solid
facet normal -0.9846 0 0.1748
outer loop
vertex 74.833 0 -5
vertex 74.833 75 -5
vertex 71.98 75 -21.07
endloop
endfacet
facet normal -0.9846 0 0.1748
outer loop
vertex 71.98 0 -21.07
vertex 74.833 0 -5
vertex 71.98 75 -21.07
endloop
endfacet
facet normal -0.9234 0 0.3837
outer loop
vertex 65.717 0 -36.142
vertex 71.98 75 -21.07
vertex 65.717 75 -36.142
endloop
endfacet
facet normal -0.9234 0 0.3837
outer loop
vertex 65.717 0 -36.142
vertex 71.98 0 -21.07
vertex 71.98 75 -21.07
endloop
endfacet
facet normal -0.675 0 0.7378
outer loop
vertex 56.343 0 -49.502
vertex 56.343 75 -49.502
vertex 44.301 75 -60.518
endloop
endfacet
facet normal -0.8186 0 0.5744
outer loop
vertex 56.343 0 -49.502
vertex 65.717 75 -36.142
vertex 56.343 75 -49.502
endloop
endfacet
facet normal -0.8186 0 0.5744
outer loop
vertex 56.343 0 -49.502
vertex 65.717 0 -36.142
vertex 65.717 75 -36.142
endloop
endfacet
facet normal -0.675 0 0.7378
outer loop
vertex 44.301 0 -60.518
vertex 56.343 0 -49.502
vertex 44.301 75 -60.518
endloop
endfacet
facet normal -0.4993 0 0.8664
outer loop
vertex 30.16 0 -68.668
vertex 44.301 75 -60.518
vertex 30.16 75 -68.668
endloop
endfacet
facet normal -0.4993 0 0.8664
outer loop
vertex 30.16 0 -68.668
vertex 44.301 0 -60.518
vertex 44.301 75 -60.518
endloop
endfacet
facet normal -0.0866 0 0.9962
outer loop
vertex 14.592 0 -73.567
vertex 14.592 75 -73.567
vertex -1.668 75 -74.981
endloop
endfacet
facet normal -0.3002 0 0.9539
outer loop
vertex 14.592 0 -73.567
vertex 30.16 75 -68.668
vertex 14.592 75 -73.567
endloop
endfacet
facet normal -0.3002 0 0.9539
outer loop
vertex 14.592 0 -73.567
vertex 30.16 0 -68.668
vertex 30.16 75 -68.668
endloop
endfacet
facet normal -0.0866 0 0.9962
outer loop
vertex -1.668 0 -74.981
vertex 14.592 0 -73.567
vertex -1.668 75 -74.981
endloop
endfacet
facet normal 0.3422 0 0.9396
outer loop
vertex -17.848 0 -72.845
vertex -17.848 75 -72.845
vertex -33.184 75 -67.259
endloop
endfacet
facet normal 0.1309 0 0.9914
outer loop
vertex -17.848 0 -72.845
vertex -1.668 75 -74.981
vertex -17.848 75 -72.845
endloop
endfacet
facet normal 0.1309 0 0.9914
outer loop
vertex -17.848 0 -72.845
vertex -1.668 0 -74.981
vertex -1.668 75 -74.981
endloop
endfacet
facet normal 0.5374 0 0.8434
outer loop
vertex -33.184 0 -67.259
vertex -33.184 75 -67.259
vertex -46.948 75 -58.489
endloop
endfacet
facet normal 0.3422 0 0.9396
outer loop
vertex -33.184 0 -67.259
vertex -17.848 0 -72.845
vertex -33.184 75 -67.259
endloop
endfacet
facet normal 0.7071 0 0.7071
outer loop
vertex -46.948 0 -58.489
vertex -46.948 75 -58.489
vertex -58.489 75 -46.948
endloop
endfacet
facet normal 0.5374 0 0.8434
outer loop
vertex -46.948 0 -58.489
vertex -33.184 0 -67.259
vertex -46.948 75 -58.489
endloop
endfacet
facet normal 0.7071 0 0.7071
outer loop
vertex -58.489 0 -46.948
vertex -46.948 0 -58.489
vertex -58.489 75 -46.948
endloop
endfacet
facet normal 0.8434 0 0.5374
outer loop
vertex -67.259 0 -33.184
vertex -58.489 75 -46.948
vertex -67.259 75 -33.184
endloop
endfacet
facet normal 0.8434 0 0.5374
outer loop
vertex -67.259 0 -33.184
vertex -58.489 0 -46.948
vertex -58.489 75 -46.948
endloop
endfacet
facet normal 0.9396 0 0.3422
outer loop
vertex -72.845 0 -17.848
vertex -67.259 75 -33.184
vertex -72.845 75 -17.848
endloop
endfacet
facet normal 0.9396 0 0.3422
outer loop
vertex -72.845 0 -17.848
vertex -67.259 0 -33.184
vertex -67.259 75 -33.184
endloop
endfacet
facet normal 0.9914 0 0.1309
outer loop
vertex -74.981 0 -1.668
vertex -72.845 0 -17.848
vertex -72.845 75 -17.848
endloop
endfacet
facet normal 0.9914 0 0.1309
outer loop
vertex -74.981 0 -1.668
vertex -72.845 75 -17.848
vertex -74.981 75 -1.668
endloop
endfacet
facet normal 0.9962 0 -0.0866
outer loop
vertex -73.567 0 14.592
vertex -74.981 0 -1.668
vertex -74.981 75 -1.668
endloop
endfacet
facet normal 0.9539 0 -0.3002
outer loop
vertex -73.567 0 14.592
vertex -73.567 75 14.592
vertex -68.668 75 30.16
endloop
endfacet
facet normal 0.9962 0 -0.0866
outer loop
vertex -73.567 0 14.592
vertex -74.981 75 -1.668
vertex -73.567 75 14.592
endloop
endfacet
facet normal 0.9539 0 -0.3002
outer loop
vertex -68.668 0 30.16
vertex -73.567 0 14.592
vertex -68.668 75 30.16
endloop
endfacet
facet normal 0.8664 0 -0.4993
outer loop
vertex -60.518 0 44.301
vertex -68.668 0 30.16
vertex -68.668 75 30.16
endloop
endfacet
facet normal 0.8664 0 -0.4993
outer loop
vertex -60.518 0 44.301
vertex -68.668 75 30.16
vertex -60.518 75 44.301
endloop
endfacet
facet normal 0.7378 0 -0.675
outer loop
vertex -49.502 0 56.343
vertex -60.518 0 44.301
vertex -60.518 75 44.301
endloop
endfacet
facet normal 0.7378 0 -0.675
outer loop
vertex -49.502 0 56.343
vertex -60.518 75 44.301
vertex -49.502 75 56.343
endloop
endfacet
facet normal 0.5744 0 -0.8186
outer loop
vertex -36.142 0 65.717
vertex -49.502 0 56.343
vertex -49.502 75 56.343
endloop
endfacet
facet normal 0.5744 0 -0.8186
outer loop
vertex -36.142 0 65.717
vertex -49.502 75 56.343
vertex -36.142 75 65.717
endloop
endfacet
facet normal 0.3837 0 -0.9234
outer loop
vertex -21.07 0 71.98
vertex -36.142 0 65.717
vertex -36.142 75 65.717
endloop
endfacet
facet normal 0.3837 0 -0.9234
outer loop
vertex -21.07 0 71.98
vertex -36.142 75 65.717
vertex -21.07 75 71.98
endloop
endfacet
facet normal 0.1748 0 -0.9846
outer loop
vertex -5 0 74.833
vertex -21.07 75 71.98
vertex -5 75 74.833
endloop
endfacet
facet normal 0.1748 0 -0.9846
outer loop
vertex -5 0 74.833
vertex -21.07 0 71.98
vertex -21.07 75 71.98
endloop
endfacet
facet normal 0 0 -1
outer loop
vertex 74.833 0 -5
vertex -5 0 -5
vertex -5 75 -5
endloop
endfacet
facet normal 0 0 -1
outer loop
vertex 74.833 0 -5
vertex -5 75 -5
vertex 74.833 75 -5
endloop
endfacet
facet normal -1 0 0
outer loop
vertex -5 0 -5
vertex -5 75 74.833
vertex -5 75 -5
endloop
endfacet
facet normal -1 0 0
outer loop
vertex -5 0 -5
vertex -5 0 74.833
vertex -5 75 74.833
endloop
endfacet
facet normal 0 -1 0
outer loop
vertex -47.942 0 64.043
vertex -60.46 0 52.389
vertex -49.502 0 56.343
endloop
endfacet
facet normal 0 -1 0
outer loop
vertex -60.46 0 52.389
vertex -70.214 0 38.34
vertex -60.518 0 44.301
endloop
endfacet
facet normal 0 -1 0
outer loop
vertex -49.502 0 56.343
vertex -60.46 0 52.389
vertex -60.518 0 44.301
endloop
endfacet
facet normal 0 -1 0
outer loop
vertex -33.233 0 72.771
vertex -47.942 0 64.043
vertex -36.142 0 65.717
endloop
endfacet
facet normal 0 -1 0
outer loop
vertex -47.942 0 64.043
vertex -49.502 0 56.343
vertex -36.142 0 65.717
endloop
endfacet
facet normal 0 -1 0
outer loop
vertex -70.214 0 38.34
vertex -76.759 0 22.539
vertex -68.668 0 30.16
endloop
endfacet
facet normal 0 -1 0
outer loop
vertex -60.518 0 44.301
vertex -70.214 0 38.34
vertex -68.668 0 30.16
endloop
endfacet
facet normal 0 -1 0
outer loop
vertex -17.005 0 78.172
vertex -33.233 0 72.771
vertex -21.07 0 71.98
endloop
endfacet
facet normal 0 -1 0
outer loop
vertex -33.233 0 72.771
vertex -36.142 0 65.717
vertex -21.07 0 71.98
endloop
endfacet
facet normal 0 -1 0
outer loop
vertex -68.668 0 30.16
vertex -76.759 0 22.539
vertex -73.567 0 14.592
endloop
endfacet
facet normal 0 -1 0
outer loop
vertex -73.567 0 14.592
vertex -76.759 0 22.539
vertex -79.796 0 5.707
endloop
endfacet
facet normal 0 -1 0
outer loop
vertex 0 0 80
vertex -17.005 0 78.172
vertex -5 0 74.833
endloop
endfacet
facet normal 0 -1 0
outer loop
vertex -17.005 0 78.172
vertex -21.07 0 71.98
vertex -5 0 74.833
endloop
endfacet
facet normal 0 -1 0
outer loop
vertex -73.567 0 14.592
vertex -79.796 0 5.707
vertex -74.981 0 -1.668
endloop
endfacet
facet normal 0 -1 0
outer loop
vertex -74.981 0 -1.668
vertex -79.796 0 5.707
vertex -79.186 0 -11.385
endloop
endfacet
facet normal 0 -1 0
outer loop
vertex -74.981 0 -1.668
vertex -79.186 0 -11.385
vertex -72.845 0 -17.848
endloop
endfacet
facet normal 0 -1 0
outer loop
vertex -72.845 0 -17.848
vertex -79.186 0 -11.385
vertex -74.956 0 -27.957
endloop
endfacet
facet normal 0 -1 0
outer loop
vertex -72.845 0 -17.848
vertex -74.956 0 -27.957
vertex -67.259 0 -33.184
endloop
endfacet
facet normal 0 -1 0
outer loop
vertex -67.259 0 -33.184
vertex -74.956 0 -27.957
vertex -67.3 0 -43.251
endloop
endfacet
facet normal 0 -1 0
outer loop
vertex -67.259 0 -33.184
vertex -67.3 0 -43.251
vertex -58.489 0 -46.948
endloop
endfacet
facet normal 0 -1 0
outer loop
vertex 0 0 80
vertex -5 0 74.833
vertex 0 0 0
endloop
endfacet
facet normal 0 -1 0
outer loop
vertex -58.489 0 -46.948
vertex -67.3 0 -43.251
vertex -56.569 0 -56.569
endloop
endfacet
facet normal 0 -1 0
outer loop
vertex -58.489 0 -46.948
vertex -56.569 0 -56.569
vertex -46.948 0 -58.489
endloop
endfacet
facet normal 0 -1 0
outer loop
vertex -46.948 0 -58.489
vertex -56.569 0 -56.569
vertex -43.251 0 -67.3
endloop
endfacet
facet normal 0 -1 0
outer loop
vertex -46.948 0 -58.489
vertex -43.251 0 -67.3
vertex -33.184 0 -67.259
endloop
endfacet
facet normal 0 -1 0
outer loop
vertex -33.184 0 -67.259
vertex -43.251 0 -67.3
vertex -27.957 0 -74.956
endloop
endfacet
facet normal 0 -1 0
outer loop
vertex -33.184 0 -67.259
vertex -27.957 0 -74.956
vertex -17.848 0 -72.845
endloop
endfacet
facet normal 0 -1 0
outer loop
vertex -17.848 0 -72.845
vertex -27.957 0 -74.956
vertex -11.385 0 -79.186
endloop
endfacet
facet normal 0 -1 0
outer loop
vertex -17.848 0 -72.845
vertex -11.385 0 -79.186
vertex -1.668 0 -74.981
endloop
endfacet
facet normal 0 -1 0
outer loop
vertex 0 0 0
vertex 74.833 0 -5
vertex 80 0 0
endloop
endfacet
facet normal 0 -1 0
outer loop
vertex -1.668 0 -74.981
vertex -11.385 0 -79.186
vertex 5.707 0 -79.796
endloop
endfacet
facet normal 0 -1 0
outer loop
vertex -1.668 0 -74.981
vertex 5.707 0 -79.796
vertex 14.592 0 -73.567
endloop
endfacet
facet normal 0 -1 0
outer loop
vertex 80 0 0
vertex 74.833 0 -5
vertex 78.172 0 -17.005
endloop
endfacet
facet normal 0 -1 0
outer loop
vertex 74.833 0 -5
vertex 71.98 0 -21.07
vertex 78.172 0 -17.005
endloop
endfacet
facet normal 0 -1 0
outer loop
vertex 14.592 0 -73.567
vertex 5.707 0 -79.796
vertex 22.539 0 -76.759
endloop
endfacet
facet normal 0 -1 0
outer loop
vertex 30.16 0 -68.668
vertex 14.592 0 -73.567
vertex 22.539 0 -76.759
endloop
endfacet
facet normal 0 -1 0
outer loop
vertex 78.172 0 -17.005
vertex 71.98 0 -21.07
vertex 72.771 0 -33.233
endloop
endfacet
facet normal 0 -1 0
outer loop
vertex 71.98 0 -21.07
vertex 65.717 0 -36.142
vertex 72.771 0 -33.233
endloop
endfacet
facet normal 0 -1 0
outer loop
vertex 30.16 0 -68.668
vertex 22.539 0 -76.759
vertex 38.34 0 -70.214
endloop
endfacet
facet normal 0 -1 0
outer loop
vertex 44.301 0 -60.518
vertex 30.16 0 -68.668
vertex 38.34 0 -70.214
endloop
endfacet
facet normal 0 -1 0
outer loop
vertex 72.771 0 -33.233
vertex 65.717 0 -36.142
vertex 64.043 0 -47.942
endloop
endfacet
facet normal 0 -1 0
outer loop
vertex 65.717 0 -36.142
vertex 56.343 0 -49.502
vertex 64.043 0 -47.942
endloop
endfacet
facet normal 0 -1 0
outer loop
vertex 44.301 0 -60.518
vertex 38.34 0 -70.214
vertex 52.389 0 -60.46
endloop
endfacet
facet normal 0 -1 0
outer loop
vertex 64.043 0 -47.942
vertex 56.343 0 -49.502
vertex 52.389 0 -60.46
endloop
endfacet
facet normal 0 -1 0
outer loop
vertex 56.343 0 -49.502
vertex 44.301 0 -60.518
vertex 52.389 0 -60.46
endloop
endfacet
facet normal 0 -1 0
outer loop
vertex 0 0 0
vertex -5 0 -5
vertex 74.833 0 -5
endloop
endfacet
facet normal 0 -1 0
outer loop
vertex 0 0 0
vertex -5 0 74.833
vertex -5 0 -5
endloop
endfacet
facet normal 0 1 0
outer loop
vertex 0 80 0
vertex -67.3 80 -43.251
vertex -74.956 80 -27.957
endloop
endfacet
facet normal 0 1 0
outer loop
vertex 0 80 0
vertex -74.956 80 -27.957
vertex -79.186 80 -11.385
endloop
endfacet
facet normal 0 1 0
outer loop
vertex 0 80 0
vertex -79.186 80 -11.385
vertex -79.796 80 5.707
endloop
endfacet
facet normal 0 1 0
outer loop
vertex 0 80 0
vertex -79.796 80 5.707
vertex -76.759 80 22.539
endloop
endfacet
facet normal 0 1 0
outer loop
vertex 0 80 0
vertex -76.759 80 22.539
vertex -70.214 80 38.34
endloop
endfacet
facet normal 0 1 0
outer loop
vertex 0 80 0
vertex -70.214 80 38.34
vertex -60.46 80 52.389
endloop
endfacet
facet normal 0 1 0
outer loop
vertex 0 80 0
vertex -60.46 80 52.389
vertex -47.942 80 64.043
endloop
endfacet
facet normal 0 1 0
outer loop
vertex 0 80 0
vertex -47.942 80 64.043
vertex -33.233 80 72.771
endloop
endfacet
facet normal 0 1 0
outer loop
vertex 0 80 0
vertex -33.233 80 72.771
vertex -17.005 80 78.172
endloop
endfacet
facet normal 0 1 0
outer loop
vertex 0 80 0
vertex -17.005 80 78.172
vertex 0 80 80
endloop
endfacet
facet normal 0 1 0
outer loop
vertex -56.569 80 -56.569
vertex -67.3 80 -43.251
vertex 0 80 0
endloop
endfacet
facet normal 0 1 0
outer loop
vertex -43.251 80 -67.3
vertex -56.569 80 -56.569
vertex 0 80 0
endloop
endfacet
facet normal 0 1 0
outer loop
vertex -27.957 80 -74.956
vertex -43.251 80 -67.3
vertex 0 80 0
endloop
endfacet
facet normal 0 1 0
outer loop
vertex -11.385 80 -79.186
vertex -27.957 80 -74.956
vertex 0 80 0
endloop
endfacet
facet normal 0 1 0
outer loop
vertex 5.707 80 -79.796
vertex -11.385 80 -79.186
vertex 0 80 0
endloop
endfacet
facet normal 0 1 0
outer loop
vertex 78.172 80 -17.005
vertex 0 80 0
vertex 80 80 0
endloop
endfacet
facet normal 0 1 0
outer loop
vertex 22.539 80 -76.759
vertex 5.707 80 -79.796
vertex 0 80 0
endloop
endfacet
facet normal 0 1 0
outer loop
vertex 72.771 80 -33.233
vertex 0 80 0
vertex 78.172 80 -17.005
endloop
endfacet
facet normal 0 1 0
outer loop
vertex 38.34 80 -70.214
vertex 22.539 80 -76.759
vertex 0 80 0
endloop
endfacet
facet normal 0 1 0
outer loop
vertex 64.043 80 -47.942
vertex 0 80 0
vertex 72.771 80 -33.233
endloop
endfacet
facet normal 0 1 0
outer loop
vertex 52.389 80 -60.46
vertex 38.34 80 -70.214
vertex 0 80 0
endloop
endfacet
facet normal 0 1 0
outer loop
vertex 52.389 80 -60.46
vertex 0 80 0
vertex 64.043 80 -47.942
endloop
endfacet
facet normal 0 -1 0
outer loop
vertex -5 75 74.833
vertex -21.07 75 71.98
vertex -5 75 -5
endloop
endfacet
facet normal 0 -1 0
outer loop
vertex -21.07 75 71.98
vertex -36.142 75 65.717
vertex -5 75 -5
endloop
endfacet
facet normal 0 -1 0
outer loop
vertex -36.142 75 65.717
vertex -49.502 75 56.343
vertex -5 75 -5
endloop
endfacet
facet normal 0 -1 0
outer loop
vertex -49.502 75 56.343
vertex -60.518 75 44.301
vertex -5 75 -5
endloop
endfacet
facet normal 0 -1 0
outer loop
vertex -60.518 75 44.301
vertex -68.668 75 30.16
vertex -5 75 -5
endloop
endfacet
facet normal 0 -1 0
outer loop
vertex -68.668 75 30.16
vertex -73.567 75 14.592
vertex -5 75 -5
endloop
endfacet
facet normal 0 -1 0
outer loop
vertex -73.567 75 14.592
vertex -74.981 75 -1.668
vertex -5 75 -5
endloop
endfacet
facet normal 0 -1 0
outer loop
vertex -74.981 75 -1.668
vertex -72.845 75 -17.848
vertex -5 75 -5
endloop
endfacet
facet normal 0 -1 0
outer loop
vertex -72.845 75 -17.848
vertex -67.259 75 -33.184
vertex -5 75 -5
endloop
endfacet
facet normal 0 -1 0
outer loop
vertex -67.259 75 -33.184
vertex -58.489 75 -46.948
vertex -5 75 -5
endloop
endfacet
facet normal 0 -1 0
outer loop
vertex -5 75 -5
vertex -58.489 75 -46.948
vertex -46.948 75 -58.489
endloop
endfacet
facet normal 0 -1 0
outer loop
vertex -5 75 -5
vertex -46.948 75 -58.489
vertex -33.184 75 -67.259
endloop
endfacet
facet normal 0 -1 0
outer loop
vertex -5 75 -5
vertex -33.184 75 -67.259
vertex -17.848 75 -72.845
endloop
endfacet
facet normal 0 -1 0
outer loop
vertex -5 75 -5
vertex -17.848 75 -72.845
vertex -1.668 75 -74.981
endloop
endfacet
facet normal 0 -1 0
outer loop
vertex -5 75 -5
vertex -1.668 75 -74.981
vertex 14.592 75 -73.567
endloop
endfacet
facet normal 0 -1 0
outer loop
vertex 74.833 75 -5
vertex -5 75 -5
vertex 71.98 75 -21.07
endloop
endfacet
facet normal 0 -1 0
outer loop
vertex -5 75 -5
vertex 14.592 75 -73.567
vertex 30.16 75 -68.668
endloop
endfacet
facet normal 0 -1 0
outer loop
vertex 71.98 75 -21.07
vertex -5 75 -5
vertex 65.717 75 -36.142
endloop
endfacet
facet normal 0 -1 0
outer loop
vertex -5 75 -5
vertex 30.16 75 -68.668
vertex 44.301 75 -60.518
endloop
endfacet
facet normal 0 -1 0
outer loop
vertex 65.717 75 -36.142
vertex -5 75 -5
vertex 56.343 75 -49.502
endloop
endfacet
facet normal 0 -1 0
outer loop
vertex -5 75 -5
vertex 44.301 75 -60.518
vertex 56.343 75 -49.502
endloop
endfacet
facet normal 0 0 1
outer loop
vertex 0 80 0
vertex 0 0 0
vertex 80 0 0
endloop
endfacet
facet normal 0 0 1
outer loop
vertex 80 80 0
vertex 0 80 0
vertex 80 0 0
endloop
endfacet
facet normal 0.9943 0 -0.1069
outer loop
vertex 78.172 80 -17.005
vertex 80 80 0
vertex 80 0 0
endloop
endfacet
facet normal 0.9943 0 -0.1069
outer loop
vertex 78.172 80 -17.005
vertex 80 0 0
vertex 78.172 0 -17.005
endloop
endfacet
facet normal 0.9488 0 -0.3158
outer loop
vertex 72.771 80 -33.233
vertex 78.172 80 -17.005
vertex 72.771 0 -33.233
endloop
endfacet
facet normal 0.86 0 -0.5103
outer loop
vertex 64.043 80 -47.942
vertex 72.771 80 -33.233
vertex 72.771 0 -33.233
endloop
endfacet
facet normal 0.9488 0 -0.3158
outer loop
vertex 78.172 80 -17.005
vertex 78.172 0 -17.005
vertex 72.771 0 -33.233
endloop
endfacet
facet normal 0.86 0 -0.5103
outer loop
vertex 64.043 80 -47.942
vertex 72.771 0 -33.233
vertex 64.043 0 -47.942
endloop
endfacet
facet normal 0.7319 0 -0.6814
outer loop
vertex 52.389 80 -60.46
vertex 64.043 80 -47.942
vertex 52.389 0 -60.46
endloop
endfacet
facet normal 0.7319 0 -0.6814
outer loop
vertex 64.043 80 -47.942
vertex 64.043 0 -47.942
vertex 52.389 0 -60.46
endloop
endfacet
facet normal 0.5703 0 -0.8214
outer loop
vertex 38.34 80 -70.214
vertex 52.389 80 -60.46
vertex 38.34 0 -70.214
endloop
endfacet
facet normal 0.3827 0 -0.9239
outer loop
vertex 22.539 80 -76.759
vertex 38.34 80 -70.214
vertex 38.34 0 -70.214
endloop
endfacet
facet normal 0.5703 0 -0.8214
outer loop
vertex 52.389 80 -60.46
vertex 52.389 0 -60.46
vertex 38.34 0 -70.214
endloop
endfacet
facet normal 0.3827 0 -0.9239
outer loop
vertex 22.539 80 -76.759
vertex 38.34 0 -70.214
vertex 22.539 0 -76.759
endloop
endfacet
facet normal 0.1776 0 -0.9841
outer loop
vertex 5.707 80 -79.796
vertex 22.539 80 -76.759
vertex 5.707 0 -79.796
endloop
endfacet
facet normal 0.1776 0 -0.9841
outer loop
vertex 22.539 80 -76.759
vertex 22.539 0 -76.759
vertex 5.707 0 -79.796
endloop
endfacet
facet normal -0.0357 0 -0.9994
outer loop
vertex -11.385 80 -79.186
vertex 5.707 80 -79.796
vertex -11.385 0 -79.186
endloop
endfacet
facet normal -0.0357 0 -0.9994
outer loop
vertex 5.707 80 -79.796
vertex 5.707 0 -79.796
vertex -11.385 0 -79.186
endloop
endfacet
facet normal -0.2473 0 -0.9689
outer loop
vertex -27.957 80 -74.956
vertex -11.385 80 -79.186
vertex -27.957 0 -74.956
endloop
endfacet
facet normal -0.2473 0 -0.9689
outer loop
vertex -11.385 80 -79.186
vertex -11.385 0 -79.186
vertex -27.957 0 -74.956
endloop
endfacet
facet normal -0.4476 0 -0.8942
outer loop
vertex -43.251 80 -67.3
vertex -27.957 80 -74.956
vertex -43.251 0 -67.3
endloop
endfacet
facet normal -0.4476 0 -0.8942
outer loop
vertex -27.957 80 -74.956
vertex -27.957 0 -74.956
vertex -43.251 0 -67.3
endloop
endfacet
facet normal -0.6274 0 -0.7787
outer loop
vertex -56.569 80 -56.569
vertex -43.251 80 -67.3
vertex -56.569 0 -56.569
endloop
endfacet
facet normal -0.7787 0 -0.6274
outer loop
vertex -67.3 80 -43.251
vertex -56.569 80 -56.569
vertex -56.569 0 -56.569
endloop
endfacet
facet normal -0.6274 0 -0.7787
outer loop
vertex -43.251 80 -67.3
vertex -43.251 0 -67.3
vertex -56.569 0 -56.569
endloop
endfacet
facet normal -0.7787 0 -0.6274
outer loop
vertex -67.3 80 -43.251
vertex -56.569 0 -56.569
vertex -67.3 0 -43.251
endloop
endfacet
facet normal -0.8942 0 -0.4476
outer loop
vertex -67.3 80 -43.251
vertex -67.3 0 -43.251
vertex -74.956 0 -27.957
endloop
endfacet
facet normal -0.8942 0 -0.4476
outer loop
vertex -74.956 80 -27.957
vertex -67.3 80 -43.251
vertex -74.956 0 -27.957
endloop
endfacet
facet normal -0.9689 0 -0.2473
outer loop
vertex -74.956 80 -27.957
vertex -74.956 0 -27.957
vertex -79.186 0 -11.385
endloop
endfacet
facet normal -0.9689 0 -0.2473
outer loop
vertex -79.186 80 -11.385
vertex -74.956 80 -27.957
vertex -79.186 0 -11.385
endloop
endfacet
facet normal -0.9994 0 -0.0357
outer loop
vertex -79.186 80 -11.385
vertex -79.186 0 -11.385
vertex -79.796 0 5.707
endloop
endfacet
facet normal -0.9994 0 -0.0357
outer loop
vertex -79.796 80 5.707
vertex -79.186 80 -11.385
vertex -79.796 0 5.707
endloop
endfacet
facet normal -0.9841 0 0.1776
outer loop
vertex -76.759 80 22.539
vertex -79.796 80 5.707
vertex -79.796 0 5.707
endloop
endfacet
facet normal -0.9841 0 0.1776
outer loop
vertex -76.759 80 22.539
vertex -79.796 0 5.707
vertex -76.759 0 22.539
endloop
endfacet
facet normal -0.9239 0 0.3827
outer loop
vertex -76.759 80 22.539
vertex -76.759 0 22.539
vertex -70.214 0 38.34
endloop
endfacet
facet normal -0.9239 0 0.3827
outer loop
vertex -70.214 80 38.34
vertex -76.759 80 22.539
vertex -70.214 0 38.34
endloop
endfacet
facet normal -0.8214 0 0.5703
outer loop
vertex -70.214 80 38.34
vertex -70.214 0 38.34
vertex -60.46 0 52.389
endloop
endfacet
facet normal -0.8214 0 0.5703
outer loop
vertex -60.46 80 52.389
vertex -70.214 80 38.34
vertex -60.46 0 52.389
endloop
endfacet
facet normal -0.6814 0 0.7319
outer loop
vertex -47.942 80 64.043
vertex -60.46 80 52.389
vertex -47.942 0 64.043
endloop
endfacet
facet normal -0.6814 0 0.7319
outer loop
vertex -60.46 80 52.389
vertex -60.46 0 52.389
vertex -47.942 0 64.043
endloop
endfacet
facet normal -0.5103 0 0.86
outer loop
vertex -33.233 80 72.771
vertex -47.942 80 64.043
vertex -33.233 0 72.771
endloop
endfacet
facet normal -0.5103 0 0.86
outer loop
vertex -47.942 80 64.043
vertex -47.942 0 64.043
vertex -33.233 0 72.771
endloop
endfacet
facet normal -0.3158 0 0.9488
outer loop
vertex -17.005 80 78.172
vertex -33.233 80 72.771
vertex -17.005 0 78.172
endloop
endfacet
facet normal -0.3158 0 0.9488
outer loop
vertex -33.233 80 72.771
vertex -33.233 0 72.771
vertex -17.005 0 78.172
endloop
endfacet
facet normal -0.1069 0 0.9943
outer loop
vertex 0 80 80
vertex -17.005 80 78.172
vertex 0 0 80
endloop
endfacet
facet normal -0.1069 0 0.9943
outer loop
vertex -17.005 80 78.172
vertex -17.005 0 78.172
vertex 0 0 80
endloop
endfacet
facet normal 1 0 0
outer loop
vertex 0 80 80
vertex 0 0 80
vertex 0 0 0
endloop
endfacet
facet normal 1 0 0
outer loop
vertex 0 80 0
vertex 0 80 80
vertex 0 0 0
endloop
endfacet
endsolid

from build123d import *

# Parameters (mm, degrees)
BOSS_EXTRUDE1_DEPTH = 80
SHELL1_T            = -5


with BuildPart() as part:
    # Sketch2 → Boss-Extrude1 (new body)
    with BuildSketch(Plane(origin=(0, 0, 0), x_dir=(1, 0, 0), z_dir=(0, 1, 0))):
        with BuildLine():
            Line((0, 0), (80, 0))
            ThreePointArc((80, 0), (-56.568542495, 56.568542495), (0, -80))
            Line((0, -80), (0, 0))
        make_face()
    extrude(amount=BOSS_EXTRUDE1_DEPTH)

    # Shell1
    shell1_openings = [part.faces().sort_by_distance(p)[0] for p in [
        (-5.522847498, 0, -5.522847498),
    ]]
    offset(amount=SHELL1_T, openings=shell1_openings, kind=Kind.INTERSECTION)


solid = part.part
